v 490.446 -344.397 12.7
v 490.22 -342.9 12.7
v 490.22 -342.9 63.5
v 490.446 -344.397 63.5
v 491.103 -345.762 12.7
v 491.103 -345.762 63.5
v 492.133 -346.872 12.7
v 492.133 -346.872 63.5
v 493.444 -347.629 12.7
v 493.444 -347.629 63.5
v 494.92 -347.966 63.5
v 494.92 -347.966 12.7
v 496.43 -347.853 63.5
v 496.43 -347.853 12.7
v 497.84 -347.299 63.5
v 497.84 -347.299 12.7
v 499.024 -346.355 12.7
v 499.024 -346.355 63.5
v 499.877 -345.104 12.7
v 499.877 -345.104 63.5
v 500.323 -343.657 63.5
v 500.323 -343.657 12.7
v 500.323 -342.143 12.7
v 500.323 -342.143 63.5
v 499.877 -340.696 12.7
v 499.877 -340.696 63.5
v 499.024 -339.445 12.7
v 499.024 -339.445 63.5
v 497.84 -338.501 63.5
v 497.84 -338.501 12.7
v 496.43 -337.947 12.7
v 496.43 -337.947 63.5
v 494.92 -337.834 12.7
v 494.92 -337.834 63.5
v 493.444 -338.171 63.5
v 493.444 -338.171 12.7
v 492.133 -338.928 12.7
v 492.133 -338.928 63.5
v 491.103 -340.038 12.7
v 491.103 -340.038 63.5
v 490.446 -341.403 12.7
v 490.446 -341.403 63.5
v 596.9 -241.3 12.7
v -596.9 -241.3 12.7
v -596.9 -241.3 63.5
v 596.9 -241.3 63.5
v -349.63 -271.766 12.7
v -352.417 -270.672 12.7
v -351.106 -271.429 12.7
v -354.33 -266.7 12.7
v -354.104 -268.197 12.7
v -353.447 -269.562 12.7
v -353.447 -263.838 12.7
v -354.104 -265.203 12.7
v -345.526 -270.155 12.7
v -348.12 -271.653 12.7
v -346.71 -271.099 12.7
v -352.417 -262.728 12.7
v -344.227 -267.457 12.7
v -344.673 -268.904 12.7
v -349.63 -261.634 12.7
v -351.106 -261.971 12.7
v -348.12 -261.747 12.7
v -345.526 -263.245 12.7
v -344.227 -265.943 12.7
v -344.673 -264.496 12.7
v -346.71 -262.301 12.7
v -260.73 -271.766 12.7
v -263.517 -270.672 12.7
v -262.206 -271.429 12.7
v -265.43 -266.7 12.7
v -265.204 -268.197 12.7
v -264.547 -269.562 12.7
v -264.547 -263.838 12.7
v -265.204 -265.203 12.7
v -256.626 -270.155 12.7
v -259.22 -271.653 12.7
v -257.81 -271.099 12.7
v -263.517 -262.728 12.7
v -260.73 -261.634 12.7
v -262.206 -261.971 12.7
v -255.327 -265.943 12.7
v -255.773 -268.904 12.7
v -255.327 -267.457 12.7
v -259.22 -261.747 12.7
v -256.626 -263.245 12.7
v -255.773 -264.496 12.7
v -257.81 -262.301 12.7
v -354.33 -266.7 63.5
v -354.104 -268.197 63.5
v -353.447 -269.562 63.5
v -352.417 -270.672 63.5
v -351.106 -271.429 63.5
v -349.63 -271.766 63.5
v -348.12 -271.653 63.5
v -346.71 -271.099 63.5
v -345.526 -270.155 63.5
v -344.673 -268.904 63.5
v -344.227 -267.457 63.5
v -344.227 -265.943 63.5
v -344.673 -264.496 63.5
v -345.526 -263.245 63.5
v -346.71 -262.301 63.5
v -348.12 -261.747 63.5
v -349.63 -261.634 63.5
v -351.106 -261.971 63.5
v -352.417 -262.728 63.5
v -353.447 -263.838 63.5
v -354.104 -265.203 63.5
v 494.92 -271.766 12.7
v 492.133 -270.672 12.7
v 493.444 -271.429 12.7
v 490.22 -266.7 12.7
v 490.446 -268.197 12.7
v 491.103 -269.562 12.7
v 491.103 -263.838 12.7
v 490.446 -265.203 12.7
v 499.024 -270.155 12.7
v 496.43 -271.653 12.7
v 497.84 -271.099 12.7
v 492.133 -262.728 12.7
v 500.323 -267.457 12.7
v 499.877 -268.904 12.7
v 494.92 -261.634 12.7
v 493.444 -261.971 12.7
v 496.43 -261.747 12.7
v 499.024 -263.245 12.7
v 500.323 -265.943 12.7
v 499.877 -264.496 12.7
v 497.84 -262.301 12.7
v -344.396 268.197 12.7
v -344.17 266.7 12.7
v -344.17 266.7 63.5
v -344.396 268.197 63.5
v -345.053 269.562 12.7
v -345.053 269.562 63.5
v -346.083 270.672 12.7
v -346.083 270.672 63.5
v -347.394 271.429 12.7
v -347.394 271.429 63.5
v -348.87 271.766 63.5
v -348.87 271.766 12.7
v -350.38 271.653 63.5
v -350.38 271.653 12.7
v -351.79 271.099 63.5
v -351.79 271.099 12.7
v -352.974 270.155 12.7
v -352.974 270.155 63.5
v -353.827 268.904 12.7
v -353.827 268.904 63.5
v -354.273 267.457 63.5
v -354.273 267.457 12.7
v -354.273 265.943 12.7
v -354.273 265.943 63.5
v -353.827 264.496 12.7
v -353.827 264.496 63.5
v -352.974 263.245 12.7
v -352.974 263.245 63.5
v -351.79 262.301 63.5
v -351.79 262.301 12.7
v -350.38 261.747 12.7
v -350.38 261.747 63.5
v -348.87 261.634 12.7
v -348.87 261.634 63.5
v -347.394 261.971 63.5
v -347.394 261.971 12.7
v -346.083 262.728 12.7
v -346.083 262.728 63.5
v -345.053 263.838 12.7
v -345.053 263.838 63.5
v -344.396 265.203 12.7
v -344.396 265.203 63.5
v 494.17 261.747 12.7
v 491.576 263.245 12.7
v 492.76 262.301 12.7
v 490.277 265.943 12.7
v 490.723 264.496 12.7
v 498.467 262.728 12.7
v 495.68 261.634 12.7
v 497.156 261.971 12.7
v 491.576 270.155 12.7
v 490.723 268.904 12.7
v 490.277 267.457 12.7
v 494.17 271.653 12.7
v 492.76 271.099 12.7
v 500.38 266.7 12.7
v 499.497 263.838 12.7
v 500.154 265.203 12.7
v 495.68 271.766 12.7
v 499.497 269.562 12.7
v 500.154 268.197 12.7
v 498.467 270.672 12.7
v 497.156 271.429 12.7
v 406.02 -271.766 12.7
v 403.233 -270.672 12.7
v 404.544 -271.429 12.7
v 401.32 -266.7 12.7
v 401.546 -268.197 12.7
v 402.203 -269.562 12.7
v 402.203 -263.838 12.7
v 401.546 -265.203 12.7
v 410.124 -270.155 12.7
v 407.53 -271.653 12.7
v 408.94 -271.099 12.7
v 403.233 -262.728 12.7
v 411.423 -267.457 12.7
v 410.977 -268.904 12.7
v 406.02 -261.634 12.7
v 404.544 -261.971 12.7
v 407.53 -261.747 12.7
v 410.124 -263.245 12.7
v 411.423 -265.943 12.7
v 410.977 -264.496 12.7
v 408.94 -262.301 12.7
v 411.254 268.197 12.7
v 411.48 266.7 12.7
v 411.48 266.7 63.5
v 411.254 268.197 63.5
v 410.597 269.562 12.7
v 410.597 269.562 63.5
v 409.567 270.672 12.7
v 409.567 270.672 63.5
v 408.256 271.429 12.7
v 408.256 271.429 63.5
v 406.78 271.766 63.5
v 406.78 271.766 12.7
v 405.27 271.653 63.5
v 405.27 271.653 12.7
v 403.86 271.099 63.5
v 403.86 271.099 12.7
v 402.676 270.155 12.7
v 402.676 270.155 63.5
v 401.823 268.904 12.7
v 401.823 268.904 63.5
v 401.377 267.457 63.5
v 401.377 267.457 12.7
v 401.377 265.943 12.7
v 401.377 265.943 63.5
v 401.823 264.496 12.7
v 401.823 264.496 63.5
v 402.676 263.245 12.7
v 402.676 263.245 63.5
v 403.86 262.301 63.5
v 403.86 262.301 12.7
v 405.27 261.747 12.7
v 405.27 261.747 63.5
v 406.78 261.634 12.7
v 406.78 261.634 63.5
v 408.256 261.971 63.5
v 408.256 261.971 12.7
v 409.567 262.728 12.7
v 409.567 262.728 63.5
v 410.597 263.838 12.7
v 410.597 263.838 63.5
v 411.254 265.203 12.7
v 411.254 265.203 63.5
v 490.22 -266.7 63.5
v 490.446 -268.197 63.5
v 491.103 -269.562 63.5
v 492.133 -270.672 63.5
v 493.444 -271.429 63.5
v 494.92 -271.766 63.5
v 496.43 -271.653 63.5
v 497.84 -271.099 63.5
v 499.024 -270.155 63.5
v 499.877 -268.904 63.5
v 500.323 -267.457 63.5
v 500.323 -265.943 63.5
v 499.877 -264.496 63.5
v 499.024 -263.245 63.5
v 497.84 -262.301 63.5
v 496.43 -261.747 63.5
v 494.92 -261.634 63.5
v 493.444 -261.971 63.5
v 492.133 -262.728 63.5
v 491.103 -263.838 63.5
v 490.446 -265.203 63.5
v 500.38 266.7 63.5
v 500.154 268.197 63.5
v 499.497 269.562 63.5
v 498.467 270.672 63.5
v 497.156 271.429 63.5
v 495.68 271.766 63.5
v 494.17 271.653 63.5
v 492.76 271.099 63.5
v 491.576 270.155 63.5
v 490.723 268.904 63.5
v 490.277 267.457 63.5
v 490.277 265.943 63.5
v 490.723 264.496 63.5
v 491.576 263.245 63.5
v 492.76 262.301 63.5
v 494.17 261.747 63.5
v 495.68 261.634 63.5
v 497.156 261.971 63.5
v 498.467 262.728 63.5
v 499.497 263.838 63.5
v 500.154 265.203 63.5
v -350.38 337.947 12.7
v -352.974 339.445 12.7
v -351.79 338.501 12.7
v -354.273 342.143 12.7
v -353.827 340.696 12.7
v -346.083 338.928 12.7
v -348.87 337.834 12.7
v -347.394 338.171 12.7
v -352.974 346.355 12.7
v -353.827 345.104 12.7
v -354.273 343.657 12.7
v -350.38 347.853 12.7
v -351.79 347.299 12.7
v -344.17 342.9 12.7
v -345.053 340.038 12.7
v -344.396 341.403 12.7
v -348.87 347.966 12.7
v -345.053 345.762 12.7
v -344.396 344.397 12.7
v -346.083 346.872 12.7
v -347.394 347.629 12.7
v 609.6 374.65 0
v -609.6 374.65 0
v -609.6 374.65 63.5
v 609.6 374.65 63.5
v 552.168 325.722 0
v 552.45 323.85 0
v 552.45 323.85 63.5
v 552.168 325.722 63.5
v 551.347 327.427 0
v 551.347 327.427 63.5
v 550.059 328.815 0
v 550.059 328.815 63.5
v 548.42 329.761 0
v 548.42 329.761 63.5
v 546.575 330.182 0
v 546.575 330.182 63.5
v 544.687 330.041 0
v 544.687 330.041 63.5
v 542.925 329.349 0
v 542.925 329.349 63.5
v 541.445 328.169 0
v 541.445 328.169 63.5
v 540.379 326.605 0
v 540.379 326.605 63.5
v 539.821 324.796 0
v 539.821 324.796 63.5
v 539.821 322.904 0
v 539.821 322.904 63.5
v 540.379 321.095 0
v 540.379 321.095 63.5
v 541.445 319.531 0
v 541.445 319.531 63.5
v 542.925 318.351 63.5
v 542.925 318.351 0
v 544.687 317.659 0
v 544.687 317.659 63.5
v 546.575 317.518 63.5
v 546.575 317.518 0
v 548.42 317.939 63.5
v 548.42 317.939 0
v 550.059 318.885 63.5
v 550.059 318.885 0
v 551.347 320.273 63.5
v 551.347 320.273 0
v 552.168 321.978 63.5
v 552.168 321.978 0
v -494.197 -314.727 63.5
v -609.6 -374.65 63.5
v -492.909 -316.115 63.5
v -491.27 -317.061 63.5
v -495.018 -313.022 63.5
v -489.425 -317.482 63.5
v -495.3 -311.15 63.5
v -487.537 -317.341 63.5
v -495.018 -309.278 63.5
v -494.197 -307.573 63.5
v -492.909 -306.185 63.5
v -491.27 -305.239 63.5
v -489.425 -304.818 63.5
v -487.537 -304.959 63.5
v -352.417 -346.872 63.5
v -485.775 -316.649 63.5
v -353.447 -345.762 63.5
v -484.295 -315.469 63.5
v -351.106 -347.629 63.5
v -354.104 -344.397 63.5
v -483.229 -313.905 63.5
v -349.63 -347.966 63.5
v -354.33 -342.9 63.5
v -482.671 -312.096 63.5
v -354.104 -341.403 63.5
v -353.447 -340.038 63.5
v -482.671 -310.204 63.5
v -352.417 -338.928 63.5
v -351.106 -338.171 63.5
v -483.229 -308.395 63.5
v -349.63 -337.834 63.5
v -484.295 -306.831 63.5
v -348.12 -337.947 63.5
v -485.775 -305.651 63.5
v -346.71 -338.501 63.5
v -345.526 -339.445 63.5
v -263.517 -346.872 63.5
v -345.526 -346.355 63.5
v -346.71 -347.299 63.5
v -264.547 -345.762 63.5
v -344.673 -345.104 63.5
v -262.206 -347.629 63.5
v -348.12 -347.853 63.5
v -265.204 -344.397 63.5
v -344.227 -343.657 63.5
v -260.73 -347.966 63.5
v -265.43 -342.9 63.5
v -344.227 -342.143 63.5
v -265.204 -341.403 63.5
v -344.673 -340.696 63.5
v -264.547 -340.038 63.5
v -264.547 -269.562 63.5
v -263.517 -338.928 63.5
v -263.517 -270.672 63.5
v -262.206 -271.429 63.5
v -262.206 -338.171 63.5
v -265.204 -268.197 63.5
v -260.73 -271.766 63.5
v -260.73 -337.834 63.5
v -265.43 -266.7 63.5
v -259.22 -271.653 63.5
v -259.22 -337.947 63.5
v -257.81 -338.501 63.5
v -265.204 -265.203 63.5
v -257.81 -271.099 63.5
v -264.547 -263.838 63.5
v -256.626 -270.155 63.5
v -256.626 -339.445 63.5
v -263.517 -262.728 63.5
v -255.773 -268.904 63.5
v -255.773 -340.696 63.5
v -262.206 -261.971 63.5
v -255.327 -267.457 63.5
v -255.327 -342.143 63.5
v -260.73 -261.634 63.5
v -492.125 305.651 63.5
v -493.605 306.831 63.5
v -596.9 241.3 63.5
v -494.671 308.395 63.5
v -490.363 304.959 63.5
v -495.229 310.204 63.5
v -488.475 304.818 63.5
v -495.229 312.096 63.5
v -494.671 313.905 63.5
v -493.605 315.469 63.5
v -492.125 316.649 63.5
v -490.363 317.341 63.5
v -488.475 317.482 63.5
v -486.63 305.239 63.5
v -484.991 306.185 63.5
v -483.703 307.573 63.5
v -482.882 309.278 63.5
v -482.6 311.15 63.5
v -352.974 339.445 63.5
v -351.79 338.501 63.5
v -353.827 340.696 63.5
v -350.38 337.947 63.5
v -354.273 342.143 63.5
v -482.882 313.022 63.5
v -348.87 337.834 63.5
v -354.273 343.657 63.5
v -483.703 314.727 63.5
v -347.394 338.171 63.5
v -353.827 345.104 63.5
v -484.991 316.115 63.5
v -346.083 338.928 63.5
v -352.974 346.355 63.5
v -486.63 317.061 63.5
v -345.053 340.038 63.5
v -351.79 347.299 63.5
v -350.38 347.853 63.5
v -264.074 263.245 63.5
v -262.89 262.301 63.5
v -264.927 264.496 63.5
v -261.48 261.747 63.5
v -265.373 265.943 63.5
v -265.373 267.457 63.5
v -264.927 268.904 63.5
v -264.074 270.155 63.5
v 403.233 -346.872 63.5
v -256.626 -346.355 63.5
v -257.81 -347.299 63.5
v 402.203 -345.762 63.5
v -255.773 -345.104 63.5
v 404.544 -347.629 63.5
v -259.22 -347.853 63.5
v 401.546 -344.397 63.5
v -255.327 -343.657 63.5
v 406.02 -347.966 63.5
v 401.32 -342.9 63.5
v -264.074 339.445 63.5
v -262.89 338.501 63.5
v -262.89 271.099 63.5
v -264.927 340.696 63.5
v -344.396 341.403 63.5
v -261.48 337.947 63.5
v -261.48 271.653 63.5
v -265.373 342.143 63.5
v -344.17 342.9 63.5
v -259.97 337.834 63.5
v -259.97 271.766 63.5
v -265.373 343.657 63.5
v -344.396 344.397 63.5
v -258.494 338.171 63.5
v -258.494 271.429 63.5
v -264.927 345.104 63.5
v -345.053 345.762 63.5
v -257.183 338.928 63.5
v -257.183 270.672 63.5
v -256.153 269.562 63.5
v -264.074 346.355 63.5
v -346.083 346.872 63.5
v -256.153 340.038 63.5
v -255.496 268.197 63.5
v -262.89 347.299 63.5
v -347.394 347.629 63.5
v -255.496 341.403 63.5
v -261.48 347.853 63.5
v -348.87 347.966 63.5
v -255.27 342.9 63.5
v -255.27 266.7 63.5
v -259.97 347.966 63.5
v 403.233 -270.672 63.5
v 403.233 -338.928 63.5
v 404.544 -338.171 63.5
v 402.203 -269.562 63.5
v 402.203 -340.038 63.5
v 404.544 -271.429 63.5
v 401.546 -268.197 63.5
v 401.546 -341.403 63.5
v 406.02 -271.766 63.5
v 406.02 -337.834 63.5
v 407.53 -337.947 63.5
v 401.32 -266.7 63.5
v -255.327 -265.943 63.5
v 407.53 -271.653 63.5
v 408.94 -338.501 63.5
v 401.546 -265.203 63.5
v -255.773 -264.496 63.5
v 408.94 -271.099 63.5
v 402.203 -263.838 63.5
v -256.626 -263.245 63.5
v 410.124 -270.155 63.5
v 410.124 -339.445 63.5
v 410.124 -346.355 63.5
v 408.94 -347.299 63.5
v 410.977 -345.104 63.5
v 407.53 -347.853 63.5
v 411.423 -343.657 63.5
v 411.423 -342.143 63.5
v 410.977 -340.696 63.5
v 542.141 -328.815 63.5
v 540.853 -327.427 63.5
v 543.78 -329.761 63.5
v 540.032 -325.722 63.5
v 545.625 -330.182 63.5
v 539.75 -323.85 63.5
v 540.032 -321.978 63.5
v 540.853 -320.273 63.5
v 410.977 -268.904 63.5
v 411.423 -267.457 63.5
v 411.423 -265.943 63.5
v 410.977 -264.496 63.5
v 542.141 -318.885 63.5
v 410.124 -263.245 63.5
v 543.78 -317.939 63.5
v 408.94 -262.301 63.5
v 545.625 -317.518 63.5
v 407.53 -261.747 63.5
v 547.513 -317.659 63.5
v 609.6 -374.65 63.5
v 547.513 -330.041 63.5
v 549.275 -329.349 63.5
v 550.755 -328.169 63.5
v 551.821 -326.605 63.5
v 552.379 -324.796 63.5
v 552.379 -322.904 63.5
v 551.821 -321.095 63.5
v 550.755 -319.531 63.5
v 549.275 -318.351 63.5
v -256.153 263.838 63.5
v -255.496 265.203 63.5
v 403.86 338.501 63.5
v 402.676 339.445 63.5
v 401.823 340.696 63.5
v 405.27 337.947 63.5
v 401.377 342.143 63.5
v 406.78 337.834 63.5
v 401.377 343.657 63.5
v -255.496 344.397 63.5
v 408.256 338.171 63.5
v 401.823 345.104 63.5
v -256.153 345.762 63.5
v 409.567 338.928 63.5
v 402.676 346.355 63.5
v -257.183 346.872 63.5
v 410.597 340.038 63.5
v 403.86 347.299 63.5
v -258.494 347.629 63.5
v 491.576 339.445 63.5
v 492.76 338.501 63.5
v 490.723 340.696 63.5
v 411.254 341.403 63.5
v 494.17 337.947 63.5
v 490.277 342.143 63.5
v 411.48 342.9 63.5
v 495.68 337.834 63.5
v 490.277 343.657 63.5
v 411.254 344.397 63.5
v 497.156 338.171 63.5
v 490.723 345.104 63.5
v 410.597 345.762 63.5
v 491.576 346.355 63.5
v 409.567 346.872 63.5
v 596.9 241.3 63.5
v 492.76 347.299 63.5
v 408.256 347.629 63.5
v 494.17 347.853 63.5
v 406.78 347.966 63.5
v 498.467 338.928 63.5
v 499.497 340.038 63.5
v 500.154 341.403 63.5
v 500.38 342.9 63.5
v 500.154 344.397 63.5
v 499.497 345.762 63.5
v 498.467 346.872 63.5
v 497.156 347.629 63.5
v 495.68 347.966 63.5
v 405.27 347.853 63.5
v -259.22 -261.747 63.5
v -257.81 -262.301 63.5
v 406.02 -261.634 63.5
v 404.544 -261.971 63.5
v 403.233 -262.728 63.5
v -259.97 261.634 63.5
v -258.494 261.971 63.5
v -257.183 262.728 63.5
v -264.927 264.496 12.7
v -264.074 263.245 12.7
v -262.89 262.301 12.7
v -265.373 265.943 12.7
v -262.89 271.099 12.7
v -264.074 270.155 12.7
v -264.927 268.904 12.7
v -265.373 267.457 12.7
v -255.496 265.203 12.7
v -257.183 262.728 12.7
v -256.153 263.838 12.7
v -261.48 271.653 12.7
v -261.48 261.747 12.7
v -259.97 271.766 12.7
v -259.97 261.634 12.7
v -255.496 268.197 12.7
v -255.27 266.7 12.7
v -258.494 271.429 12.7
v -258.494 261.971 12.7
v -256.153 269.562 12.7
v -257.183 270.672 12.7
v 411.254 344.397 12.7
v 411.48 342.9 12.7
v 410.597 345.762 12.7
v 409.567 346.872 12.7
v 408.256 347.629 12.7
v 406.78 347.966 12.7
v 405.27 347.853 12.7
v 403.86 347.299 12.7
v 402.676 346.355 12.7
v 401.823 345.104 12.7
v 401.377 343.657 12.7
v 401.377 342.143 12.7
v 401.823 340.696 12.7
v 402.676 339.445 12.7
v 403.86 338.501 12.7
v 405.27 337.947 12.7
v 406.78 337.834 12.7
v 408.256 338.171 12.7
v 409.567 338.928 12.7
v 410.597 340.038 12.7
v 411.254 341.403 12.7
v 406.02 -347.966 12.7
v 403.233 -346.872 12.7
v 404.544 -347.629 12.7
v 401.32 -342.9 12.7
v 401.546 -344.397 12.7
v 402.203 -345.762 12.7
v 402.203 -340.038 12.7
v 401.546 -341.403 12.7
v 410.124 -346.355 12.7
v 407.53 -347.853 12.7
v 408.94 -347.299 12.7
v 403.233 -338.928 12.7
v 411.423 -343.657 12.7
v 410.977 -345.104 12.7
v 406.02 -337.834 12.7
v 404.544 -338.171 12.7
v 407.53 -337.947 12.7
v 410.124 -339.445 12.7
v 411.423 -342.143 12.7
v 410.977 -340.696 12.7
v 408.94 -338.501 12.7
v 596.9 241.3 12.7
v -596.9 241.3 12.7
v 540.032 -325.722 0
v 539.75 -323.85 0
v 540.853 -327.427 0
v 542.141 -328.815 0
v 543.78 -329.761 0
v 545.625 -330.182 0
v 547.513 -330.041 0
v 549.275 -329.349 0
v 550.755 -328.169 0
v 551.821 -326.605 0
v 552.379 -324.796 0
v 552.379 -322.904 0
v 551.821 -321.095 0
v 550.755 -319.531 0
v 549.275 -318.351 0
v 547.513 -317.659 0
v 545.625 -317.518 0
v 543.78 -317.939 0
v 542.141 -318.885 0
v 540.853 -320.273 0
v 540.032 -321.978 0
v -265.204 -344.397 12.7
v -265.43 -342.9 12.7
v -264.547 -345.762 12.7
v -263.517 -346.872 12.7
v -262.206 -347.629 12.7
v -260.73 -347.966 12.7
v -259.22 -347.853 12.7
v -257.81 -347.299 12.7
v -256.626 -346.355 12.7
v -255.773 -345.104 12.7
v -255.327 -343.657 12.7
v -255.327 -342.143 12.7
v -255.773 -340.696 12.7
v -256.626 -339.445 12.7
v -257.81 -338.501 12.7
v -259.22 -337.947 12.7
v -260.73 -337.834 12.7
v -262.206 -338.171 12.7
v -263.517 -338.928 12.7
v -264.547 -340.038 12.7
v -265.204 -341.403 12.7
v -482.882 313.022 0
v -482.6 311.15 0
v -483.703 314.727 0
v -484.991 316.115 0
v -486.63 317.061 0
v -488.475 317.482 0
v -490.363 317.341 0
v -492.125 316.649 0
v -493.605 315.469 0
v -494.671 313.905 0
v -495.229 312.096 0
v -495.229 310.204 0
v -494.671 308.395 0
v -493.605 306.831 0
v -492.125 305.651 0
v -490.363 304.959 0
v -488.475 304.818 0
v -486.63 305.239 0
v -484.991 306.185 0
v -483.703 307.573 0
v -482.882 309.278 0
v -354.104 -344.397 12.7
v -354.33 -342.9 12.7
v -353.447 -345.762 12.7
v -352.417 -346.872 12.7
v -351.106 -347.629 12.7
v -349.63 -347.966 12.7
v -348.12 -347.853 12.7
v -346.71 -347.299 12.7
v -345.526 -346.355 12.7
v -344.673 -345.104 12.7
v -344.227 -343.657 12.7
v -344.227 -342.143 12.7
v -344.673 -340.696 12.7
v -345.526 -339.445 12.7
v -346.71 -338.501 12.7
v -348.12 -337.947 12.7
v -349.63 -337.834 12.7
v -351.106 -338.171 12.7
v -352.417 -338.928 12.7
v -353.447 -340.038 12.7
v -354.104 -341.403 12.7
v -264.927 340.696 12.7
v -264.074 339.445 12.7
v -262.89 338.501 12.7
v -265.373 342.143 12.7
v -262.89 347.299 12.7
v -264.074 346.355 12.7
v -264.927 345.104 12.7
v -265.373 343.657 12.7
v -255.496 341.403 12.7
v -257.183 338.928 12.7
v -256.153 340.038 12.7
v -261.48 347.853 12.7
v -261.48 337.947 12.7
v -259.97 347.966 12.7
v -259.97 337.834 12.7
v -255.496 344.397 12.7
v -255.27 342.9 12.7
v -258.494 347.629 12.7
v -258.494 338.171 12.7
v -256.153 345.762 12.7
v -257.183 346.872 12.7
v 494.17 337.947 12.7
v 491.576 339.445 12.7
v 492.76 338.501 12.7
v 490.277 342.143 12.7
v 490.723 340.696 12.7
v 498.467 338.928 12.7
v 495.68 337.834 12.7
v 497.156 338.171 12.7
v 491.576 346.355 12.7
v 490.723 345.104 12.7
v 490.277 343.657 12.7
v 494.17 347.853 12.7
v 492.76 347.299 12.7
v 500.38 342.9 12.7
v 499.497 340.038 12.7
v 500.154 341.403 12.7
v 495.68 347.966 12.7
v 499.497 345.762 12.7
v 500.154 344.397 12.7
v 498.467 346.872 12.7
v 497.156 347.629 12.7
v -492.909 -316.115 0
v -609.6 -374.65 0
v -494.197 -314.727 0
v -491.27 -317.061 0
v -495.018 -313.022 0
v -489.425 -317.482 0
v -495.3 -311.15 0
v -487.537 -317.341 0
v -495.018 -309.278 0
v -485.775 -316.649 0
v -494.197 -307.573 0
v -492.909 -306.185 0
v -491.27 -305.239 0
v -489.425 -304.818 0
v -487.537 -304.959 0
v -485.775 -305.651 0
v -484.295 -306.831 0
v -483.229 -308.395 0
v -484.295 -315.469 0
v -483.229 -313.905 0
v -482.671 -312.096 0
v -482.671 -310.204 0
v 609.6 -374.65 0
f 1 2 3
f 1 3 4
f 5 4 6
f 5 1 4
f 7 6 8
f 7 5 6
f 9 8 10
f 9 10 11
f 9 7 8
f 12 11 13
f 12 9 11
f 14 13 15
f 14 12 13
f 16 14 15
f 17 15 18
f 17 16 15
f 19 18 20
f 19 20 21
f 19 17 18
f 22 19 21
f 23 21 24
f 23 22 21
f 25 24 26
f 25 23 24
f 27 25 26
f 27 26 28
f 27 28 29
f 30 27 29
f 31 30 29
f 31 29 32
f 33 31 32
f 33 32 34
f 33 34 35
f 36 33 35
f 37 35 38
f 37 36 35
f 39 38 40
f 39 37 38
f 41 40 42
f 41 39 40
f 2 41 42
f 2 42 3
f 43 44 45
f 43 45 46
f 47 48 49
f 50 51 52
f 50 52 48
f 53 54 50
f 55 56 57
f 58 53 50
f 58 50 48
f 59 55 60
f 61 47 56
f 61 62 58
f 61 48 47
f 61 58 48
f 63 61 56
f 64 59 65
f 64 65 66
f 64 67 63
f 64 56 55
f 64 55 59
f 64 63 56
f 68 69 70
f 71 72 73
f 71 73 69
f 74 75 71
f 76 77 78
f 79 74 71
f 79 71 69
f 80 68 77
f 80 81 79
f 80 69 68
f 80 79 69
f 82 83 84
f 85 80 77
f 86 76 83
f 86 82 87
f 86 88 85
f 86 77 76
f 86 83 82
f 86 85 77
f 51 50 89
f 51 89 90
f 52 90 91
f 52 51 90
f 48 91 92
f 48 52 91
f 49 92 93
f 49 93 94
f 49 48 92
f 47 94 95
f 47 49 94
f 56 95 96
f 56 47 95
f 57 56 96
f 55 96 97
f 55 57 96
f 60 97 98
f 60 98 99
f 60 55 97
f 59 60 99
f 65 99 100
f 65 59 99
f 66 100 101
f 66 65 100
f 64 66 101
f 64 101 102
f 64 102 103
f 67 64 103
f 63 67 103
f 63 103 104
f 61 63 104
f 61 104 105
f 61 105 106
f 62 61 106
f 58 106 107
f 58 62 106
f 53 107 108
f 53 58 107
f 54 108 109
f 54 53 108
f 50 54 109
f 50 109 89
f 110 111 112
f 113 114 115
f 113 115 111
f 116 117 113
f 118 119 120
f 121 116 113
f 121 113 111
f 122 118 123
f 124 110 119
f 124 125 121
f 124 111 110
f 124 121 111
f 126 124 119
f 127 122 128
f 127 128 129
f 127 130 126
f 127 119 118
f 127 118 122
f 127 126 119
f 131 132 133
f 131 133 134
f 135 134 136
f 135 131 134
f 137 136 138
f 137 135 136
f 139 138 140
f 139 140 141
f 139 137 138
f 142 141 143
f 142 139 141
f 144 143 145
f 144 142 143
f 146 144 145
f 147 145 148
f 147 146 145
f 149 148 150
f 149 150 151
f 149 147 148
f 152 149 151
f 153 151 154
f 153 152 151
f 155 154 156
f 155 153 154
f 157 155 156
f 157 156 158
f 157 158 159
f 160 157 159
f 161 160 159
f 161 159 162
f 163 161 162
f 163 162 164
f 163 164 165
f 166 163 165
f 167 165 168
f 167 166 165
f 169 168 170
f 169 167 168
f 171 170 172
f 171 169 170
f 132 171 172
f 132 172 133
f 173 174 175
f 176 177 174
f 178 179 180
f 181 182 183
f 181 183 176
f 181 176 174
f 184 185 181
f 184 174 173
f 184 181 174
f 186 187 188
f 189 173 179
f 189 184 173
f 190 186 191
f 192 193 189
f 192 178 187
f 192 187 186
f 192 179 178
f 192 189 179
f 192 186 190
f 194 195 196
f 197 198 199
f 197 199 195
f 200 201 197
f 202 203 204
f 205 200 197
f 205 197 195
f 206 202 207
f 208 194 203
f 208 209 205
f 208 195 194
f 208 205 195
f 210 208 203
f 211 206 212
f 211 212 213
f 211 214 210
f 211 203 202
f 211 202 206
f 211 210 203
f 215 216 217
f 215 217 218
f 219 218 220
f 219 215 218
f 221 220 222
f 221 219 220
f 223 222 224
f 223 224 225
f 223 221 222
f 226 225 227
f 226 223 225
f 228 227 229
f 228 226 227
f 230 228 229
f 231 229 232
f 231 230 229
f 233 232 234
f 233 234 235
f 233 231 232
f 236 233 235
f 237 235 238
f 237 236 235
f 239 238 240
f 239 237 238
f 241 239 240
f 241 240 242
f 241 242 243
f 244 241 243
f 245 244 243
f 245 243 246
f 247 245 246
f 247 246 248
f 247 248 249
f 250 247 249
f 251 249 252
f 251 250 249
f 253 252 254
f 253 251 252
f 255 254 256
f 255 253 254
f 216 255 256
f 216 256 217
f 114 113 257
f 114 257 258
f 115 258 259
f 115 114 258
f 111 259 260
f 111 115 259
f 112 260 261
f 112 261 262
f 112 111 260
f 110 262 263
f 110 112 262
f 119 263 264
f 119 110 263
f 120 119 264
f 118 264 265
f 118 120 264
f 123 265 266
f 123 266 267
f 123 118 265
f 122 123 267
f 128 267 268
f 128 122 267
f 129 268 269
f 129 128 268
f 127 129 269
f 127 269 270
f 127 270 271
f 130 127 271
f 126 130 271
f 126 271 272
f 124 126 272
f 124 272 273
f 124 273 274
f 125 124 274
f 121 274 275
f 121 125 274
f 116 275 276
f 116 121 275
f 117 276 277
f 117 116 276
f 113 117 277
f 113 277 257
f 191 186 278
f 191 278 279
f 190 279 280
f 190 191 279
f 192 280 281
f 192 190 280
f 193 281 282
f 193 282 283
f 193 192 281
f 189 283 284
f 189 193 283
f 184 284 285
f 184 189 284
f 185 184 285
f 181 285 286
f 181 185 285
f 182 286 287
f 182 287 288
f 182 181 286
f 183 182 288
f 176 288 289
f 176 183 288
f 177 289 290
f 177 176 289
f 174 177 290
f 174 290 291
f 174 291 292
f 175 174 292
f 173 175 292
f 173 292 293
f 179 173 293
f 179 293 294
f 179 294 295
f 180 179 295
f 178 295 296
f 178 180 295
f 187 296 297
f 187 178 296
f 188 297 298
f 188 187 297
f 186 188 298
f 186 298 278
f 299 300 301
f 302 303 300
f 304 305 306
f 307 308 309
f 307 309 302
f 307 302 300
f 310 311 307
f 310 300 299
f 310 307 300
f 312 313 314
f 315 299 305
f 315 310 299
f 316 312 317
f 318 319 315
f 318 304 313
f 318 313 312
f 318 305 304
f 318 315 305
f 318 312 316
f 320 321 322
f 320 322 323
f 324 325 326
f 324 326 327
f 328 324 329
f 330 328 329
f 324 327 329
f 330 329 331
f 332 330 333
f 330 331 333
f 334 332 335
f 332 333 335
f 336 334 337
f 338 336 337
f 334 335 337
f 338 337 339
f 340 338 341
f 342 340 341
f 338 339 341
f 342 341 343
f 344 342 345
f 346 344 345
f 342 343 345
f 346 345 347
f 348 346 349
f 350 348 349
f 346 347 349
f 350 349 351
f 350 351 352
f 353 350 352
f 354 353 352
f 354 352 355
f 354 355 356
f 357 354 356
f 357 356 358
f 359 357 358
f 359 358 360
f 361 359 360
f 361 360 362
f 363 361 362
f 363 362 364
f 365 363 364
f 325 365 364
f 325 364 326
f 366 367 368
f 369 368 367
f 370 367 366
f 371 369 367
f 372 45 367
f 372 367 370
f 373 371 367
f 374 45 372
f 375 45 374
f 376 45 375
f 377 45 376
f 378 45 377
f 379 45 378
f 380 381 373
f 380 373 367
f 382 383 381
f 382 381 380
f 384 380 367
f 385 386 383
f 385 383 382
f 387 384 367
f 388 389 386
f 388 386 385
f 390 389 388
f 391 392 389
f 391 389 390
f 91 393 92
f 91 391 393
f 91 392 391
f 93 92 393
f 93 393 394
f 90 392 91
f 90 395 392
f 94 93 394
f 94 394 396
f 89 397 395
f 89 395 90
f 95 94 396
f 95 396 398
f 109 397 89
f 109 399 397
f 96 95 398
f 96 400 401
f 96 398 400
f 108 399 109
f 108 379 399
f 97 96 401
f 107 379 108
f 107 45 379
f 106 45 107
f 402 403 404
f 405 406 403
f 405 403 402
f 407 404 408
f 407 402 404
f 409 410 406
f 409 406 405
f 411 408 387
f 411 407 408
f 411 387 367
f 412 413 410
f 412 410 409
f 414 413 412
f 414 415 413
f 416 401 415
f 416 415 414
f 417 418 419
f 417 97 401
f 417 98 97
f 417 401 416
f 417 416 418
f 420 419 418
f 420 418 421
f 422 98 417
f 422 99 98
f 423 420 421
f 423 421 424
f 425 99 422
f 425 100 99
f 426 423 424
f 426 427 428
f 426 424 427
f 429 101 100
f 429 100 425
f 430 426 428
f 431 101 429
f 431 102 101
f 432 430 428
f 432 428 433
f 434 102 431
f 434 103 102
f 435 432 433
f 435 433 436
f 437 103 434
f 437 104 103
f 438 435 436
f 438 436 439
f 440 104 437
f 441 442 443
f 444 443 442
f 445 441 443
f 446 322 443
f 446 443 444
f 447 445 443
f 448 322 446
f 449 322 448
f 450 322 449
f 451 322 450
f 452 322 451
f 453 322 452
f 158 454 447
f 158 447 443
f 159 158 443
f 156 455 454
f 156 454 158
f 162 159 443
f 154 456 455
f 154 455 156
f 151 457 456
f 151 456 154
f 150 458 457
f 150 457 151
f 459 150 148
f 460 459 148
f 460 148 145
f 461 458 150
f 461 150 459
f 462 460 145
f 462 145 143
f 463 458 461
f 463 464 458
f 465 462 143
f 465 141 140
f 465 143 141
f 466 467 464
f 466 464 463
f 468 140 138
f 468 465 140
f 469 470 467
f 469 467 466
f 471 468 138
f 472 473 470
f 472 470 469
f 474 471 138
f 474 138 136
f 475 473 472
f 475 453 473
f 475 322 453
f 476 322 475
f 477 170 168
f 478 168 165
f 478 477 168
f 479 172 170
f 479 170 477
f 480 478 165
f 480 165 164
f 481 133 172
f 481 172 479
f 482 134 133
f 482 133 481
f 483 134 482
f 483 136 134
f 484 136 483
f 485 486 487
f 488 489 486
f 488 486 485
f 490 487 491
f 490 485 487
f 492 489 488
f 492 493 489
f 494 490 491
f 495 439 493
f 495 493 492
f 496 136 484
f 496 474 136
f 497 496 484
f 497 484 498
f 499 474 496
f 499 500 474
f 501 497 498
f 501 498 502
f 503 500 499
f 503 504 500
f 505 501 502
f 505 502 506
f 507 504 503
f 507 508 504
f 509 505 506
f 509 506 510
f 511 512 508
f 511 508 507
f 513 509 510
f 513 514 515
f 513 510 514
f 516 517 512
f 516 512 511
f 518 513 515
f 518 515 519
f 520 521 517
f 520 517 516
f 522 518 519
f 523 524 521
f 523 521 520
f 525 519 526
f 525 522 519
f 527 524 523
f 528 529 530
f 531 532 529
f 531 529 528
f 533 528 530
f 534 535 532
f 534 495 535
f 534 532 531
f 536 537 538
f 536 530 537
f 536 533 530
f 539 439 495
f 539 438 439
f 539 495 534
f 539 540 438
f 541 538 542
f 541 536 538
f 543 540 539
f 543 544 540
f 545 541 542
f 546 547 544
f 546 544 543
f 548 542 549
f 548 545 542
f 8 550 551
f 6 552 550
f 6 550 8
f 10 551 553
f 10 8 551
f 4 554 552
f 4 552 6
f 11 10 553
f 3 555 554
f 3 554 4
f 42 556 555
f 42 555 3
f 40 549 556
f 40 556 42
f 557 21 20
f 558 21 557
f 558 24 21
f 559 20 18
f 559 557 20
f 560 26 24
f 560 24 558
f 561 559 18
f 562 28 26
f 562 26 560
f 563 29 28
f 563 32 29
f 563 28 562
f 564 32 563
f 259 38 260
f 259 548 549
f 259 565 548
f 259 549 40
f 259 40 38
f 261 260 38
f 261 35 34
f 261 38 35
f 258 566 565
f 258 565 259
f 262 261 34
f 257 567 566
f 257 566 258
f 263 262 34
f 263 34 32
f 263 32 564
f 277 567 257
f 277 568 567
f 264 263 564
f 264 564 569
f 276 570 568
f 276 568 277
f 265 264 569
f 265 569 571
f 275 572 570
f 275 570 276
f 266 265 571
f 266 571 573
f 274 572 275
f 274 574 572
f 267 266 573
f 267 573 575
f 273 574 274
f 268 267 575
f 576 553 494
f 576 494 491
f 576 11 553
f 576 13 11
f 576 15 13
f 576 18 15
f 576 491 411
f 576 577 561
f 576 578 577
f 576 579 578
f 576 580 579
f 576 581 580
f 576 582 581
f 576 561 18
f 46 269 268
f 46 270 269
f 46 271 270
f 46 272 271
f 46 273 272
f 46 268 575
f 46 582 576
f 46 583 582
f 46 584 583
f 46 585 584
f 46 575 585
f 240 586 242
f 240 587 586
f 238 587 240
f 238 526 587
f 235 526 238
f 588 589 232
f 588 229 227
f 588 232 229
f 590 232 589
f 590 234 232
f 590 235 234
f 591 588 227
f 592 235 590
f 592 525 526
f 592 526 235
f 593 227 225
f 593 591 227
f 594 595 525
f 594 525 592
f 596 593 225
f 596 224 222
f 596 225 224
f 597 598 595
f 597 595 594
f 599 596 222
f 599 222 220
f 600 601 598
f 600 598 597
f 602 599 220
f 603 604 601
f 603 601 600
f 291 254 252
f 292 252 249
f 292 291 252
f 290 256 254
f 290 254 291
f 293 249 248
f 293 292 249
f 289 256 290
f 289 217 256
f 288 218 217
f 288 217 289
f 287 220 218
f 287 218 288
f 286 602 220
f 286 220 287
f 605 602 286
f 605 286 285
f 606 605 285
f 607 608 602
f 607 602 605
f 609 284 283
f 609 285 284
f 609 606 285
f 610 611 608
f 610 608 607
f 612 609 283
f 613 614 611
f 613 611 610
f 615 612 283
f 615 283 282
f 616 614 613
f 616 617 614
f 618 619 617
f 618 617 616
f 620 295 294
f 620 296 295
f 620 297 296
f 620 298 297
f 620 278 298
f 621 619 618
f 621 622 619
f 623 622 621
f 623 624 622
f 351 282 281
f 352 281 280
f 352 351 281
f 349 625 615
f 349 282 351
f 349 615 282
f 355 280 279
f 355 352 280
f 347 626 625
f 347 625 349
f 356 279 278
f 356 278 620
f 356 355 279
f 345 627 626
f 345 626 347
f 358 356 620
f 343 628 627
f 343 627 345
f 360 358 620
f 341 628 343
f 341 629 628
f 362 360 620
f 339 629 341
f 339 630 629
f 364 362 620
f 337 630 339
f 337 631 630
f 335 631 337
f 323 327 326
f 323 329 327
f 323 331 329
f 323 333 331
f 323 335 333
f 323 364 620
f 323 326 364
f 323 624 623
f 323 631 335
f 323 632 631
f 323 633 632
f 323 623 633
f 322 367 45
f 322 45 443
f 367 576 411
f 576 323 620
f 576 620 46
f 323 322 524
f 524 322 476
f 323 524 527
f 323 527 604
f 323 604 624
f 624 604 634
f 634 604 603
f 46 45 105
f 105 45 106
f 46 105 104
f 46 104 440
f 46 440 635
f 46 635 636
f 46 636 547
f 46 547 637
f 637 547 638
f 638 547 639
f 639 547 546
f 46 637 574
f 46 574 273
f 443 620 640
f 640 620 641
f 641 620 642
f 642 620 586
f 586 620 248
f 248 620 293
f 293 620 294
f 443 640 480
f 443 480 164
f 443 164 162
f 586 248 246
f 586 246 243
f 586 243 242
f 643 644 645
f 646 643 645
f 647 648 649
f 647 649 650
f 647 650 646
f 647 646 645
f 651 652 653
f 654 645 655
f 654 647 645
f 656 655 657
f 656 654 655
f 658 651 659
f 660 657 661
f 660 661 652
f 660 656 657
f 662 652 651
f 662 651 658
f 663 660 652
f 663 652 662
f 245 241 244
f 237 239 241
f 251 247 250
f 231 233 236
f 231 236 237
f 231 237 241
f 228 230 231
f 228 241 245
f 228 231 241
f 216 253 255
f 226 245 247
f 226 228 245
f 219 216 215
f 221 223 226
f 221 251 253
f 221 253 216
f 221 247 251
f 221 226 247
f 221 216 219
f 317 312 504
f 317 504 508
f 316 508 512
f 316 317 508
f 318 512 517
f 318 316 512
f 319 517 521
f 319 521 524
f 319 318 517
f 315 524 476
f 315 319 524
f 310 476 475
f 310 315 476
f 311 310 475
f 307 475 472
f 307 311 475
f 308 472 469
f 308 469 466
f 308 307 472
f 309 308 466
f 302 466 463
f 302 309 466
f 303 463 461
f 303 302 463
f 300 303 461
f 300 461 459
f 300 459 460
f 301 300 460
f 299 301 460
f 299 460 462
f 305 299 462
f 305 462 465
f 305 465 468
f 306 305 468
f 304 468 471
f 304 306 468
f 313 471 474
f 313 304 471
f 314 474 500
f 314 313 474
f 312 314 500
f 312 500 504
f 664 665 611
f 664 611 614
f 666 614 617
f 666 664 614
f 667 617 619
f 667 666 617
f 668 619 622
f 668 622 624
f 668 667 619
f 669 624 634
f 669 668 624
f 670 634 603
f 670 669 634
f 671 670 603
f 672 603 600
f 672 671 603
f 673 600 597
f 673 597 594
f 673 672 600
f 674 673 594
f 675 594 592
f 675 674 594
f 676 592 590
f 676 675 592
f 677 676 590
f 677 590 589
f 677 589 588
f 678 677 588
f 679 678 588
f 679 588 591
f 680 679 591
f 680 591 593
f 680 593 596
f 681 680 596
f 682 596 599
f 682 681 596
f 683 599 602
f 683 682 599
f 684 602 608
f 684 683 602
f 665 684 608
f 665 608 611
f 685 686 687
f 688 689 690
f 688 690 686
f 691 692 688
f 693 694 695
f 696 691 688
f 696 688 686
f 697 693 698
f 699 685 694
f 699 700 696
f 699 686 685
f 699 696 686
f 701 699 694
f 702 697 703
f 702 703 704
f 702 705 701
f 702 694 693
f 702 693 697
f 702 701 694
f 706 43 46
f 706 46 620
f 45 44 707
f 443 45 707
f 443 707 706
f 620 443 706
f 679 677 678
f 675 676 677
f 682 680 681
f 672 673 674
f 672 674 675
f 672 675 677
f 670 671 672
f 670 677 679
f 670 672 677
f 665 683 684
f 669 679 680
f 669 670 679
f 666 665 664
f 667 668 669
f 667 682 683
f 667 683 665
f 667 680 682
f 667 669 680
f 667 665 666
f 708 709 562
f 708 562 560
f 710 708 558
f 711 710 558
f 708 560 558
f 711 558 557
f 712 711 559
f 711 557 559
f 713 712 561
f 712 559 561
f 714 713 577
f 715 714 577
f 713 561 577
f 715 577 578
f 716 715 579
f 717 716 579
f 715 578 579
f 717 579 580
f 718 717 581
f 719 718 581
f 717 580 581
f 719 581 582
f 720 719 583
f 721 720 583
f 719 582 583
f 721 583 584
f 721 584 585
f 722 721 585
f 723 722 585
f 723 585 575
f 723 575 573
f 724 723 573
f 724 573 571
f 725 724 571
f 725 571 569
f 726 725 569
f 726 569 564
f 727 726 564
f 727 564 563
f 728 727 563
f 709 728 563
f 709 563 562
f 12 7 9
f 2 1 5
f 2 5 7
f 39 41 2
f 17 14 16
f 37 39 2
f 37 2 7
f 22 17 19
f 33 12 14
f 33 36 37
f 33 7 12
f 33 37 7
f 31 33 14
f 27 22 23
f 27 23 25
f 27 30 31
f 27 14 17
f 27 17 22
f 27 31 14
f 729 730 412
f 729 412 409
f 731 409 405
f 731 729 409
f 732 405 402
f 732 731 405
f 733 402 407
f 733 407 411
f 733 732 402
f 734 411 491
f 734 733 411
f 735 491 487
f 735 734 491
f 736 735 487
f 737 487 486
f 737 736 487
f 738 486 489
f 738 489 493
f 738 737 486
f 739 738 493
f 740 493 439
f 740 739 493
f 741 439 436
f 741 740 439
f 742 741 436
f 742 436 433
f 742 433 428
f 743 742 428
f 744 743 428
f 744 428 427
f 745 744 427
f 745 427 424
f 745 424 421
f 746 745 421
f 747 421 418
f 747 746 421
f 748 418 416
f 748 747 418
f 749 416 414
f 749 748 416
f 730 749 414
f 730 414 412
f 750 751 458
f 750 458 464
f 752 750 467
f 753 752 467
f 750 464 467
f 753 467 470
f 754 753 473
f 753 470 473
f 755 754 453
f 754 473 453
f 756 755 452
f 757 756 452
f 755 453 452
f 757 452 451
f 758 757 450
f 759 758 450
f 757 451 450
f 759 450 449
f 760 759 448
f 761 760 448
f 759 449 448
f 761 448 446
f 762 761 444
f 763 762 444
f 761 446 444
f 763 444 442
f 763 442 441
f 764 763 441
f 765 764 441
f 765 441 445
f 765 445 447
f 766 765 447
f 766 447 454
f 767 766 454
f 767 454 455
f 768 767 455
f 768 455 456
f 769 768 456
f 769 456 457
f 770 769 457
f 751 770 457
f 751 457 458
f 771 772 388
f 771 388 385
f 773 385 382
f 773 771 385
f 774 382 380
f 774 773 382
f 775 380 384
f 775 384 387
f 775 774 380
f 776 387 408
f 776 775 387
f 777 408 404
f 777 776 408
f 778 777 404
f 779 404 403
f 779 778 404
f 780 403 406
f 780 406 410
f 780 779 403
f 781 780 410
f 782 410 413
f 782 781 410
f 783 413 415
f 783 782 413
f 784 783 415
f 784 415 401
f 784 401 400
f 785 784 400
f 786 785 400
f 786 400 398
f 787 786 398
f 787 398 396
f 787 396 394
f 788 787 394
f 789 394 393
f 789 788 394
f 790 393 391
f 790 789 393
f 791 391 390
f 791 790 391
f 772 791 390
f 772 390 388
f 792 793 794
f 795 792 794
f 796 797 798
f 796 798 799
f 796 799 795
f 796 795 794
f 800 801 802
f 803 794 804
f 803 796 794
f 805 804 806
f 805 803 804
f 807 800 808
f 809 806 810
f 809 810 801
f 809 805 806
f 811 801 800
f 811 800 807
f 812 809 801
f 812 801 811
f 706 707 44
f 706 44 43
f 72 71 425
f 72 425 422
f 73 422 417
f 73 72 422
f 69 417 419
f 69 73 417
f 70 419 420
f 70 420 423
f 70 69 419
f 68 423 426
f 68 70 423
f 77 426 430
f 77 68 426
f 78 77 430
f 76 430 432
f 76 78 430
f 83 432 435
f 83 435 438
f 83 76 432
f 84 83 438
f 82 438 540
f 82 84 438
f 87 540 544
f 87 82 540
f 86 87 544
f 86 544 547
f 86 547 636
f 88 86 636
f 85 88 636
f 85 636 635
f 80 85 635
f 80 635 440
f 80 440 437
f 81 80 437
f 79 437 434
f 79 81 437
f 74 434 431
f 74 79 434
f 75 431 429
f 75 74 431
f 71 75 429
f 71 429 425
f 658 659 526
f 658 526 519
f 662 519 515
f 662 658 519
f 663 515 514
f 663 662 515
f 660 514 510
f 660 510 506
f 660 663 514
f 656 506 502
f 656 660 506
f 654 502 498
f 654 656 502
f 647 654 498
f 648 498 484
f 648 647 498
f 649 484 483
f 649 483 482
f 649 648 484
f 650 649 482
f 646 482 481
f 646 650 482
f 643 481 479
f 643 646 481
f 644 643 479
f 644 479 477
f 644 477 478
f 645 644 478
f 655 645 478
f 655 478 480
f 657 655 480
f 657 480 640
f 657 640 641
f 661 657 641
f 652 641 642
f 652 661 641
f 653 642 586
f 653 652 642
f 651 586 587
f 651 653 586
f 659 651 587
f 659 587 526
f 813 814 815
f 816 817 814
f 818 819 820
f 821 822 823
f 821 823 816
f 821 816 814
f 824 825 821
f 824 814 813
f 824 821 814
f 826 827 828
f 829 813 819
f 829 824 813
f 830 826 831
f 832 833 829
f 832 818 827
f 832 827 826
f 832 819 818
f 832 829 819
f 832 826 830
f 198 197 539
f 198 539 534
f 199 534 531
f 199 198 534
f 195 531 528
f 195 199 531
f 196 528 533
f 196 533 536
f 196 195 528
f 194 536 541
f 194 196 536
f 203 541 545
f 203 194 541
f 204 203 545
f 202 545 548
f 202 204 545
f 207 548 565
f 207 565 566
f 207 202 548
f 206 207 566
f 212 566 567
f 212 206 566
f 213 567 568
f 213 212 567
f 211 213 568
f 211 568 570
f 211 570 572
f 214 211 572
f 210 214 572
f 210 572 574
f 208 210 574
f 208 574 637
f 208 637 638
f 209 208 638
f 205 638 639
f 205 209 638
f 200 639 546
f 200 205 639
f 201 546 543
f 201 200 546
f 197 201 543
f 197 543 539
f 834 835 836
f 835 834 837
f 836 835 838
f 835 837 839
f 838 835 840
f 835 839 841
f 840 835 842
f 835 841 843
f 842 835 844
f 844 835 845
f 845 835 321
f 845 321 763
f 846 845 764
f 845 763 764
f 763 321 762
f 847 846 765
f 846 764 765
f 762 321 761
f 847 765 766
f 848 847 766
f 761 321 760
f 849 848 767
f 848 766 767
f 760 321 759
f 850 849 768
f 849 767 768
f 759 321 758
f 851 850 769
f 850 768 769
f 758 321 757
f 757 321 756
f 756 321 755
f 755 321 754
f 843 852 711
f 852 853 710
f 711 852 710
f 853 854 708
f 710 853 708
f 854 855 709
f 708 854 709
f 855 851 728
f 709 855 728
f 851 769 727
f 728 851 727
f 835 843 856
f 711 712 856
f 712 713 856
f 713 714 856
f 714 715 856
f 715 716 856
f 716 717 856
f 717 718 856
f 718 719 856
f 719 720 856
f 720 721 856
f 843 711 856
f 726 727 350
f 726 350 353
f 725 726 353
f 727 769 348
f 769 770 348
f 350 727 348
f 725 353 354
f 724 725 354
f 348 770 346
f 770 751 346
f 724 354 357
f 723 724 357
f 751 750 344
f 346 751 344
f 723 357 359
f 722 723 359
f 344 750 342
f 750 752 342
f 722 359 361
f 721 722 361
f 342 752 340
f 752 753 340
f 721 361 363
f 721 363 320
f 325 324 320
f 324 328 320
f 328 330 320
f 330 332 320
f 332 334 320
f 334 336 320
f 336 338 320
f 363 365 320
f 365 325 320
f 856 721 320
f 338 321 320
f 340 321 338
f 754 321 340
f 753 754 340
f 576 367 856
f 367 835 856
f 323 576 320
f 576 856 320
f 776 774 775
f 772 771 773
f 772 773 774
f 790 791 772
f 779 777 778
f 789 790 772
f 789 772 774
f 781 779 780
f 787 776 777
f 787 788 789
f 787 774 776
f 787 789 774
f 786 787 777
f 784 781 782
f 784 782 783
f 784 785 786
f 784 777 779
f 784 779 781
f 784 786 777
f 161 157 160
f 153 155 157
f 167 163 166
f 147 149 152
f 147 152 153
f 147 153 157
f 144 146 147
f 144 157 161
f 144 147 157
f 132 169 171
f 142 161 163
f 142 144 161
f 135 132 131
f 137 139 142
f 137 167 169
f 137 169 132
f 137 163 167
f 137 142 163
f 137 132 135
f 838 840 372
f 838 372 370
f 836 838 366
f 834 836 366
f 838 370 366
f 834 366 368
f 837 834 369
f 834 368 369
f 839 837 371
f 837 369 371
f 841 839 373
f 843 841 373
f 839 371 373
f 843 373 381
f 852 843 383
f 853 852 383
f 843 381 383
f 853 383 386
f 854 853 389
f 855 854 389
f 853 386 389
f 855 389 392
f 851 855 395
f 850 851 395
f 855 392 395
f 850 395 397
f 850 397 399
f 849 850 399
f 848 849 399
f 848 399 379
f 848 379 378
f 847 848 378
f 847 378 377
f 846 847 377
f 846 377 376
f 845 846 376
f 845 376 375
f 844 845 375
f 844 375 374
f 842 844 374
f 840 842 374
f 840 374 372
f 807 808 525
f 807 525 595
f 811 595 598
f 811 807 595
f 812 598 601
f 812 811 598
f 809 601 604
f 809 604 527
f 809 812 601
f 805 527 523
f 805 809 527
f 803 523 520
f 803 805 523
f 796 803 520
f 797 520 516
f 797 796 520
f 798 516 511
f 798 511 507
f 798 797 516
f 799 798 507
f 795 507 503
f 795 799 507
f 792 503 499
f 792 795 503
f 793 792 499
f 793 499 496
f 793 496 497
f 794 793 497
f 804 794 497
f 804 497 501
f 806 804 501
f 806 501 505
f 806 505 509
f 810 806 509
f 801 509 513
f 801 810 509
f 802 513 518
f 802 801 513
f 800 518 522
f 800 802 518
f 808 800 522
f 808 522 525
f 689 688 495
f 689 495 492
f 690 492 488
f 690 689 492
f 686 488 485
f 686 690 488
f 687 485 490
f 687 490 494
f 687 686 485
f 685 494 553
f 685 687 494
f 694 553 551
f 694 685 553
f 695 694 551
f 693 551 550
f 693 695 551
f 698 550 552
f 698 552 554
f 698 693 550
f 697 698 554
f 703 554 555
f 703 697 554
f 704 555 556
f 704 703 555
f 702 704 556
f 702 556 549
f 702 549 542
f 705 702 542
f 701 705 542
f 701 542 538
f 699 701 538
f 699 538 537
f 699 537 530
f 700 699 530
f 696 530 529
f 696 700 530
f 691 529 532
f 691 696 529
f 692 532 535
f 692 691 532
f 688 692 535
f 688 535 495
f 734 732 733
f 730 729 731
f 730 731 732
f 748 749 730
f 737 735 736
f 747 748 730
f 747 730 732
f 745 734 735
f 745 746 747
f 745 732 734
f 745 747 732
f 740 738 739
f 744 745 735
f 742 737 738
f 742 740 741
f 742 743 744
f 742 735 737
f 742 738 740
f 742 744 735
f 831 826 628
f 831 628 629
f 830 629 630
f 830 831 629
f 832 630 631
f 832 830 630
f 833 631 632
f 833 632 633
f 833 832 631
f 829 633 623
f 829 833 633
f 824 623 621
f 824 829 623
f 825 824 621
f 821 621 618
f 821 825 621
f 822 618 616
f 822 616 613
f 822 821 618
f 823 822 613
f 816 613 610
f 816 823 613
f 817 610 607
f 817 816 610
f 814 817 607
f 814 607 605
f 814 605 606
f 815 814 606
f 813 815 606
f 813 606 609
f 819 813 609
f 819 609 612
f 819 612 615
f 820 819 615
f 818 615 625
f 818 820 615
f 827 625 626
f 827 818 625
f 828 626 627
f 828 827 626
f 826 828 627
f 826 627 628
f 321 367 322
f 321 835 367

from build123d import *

# Parameters (mm, degrees)
SKETCH1_W           = 1219.2
SKETCH1_H           = 749.3
BOSS_EXTRUDE1_DEPTH = 12.7
SKETCH2_W           = 1219.2
SKETCH2_H           = 749.3
SKETCH2_W_2         = 1193.8
SKETCH2_H_2         = 482.6
SKETCH2_R           = 5.08
BOSS_EXTRUDE2_DEPTH = 50.8
SKETCH3_R           = 6.35
CUT_EXTRUDE1_DEPTH  = 719.336294851


with BuildPart() as part:
    # Sketch1 → Boss-Extrude1 (new body)
    with BuildSketch(Plane.XY):
        Rectangle(SKETCH1_W, SKETCH1_H)
    extrude(amount=BOSS_EXTRUDE1_DEPTH)

    # Sketch2 → Boss-Extrude2 (add)
    with BuildSketch(Plane.XY.offset(12.7)):
        Rectangle(SKETCH2_W, SKETCH2_H)
        Rectangle(SKETCH2_W_2, SKETCH2_H_2, mode=Mode.SUBTRACT)
        with Locations(Location((495.3, -266.7, 0), (0, 0, 180))):
            Circle(SKETCH2_R, mode=Mode.SUBTRACT)
        with Locations(Location((406.4, -266.7, 0), (0, 0, 180))):
            Circle(SKETCH2_R, mode=Mode.SUBTRACT)
        with Locations(Location((-349.25, -342.9, 0), (0, 0, 180))):
            Circle(SKETCH2_R, mode=Mode.SUBTRACT)
        with Locations(Location((-349.25, -266.7, 0), (0, 0, 180))):
            Circle(SKETCH2_R, mode=Mode.SUBTRACT)
        with Locations(Location((-260.35, -342.9, 0), (0, 0, 180))):
            Circle(SKETCH2_R, mode=Mode.SUBTRACT)
        with Locations(Location((-260.35, -266.7, 0), (0, 0, 180))):
            Circle(SKETCH2_R, mode=Mode.SUBTRACT)
        with Locations(Location((406.4, -342.9, 0), (0, 0, 180))):
            Circle(SKETCH2_R, mode=Mode.SUBTRACT)
        with Locations(Location((495.3, -342.9, 0), (0, 0, 180))):
            Circle(SKETCH2_R, mode=Mode.SUBTRACT)
        with Locations((406.4, 342.9)):
            Circle(SKETCH2_R, mode=Mode.SUBTRACT)
        with Locations((495.3, 266.7)):
            Circle(SKETCH2_R, mode=Mode.SUBTRACT)
        with Locations((406.4, 266.7)):
            Circle(SKETCH2_R, mode=Mode.SUBTRACT)
        with Locations((495.3, 342.9)):
            Circle(SKETCH2_R, mode=Mode.SUBTRACT)
        with Locations((-260.35, 266.7)):
            Circle(SKETCH2_R, mode=Mode.SUBTRACT)
        with Locations((-349.25, 342.9)):
            Circle(SKETCH2_R, mode=Mode.SUBTRACT)
        with Locations((-349.25, 266.7)):
            Circle(SKETCH2_R, mode=Mode.SUBTRACT)
        with Locations((-260.35, 342.9)):
            Circle(SKETCH2_R, mode=Mode.SUBTRACT)
    extrude(amount=BOSS_EXTRUDE2_DEPTH)

    # Sketch3 → Cut-Extrude1 (cut, through all)
    with BuildSketch(Plane.XY.offset(63.5)):
        with Locations((-488.95, 311.15)):
            Circle(SKETCH3_R)
        with Locations((546.1, 323.85)):
            Circle(SKETCH3_R)
        with Locations(Location((546.1, -323.85, 0), (0, 0, 180))):
            Circle(SKETCH3_R)
        with Locations(Location((-488.95, -311.15, 0), (0, 0, 180))):
            Circle(SKETCH3_R)
    extrude(amount=-CUT_EXTRUDE1_DEPTH, mode=Mode.SUBTRACT)


solid = part.part
